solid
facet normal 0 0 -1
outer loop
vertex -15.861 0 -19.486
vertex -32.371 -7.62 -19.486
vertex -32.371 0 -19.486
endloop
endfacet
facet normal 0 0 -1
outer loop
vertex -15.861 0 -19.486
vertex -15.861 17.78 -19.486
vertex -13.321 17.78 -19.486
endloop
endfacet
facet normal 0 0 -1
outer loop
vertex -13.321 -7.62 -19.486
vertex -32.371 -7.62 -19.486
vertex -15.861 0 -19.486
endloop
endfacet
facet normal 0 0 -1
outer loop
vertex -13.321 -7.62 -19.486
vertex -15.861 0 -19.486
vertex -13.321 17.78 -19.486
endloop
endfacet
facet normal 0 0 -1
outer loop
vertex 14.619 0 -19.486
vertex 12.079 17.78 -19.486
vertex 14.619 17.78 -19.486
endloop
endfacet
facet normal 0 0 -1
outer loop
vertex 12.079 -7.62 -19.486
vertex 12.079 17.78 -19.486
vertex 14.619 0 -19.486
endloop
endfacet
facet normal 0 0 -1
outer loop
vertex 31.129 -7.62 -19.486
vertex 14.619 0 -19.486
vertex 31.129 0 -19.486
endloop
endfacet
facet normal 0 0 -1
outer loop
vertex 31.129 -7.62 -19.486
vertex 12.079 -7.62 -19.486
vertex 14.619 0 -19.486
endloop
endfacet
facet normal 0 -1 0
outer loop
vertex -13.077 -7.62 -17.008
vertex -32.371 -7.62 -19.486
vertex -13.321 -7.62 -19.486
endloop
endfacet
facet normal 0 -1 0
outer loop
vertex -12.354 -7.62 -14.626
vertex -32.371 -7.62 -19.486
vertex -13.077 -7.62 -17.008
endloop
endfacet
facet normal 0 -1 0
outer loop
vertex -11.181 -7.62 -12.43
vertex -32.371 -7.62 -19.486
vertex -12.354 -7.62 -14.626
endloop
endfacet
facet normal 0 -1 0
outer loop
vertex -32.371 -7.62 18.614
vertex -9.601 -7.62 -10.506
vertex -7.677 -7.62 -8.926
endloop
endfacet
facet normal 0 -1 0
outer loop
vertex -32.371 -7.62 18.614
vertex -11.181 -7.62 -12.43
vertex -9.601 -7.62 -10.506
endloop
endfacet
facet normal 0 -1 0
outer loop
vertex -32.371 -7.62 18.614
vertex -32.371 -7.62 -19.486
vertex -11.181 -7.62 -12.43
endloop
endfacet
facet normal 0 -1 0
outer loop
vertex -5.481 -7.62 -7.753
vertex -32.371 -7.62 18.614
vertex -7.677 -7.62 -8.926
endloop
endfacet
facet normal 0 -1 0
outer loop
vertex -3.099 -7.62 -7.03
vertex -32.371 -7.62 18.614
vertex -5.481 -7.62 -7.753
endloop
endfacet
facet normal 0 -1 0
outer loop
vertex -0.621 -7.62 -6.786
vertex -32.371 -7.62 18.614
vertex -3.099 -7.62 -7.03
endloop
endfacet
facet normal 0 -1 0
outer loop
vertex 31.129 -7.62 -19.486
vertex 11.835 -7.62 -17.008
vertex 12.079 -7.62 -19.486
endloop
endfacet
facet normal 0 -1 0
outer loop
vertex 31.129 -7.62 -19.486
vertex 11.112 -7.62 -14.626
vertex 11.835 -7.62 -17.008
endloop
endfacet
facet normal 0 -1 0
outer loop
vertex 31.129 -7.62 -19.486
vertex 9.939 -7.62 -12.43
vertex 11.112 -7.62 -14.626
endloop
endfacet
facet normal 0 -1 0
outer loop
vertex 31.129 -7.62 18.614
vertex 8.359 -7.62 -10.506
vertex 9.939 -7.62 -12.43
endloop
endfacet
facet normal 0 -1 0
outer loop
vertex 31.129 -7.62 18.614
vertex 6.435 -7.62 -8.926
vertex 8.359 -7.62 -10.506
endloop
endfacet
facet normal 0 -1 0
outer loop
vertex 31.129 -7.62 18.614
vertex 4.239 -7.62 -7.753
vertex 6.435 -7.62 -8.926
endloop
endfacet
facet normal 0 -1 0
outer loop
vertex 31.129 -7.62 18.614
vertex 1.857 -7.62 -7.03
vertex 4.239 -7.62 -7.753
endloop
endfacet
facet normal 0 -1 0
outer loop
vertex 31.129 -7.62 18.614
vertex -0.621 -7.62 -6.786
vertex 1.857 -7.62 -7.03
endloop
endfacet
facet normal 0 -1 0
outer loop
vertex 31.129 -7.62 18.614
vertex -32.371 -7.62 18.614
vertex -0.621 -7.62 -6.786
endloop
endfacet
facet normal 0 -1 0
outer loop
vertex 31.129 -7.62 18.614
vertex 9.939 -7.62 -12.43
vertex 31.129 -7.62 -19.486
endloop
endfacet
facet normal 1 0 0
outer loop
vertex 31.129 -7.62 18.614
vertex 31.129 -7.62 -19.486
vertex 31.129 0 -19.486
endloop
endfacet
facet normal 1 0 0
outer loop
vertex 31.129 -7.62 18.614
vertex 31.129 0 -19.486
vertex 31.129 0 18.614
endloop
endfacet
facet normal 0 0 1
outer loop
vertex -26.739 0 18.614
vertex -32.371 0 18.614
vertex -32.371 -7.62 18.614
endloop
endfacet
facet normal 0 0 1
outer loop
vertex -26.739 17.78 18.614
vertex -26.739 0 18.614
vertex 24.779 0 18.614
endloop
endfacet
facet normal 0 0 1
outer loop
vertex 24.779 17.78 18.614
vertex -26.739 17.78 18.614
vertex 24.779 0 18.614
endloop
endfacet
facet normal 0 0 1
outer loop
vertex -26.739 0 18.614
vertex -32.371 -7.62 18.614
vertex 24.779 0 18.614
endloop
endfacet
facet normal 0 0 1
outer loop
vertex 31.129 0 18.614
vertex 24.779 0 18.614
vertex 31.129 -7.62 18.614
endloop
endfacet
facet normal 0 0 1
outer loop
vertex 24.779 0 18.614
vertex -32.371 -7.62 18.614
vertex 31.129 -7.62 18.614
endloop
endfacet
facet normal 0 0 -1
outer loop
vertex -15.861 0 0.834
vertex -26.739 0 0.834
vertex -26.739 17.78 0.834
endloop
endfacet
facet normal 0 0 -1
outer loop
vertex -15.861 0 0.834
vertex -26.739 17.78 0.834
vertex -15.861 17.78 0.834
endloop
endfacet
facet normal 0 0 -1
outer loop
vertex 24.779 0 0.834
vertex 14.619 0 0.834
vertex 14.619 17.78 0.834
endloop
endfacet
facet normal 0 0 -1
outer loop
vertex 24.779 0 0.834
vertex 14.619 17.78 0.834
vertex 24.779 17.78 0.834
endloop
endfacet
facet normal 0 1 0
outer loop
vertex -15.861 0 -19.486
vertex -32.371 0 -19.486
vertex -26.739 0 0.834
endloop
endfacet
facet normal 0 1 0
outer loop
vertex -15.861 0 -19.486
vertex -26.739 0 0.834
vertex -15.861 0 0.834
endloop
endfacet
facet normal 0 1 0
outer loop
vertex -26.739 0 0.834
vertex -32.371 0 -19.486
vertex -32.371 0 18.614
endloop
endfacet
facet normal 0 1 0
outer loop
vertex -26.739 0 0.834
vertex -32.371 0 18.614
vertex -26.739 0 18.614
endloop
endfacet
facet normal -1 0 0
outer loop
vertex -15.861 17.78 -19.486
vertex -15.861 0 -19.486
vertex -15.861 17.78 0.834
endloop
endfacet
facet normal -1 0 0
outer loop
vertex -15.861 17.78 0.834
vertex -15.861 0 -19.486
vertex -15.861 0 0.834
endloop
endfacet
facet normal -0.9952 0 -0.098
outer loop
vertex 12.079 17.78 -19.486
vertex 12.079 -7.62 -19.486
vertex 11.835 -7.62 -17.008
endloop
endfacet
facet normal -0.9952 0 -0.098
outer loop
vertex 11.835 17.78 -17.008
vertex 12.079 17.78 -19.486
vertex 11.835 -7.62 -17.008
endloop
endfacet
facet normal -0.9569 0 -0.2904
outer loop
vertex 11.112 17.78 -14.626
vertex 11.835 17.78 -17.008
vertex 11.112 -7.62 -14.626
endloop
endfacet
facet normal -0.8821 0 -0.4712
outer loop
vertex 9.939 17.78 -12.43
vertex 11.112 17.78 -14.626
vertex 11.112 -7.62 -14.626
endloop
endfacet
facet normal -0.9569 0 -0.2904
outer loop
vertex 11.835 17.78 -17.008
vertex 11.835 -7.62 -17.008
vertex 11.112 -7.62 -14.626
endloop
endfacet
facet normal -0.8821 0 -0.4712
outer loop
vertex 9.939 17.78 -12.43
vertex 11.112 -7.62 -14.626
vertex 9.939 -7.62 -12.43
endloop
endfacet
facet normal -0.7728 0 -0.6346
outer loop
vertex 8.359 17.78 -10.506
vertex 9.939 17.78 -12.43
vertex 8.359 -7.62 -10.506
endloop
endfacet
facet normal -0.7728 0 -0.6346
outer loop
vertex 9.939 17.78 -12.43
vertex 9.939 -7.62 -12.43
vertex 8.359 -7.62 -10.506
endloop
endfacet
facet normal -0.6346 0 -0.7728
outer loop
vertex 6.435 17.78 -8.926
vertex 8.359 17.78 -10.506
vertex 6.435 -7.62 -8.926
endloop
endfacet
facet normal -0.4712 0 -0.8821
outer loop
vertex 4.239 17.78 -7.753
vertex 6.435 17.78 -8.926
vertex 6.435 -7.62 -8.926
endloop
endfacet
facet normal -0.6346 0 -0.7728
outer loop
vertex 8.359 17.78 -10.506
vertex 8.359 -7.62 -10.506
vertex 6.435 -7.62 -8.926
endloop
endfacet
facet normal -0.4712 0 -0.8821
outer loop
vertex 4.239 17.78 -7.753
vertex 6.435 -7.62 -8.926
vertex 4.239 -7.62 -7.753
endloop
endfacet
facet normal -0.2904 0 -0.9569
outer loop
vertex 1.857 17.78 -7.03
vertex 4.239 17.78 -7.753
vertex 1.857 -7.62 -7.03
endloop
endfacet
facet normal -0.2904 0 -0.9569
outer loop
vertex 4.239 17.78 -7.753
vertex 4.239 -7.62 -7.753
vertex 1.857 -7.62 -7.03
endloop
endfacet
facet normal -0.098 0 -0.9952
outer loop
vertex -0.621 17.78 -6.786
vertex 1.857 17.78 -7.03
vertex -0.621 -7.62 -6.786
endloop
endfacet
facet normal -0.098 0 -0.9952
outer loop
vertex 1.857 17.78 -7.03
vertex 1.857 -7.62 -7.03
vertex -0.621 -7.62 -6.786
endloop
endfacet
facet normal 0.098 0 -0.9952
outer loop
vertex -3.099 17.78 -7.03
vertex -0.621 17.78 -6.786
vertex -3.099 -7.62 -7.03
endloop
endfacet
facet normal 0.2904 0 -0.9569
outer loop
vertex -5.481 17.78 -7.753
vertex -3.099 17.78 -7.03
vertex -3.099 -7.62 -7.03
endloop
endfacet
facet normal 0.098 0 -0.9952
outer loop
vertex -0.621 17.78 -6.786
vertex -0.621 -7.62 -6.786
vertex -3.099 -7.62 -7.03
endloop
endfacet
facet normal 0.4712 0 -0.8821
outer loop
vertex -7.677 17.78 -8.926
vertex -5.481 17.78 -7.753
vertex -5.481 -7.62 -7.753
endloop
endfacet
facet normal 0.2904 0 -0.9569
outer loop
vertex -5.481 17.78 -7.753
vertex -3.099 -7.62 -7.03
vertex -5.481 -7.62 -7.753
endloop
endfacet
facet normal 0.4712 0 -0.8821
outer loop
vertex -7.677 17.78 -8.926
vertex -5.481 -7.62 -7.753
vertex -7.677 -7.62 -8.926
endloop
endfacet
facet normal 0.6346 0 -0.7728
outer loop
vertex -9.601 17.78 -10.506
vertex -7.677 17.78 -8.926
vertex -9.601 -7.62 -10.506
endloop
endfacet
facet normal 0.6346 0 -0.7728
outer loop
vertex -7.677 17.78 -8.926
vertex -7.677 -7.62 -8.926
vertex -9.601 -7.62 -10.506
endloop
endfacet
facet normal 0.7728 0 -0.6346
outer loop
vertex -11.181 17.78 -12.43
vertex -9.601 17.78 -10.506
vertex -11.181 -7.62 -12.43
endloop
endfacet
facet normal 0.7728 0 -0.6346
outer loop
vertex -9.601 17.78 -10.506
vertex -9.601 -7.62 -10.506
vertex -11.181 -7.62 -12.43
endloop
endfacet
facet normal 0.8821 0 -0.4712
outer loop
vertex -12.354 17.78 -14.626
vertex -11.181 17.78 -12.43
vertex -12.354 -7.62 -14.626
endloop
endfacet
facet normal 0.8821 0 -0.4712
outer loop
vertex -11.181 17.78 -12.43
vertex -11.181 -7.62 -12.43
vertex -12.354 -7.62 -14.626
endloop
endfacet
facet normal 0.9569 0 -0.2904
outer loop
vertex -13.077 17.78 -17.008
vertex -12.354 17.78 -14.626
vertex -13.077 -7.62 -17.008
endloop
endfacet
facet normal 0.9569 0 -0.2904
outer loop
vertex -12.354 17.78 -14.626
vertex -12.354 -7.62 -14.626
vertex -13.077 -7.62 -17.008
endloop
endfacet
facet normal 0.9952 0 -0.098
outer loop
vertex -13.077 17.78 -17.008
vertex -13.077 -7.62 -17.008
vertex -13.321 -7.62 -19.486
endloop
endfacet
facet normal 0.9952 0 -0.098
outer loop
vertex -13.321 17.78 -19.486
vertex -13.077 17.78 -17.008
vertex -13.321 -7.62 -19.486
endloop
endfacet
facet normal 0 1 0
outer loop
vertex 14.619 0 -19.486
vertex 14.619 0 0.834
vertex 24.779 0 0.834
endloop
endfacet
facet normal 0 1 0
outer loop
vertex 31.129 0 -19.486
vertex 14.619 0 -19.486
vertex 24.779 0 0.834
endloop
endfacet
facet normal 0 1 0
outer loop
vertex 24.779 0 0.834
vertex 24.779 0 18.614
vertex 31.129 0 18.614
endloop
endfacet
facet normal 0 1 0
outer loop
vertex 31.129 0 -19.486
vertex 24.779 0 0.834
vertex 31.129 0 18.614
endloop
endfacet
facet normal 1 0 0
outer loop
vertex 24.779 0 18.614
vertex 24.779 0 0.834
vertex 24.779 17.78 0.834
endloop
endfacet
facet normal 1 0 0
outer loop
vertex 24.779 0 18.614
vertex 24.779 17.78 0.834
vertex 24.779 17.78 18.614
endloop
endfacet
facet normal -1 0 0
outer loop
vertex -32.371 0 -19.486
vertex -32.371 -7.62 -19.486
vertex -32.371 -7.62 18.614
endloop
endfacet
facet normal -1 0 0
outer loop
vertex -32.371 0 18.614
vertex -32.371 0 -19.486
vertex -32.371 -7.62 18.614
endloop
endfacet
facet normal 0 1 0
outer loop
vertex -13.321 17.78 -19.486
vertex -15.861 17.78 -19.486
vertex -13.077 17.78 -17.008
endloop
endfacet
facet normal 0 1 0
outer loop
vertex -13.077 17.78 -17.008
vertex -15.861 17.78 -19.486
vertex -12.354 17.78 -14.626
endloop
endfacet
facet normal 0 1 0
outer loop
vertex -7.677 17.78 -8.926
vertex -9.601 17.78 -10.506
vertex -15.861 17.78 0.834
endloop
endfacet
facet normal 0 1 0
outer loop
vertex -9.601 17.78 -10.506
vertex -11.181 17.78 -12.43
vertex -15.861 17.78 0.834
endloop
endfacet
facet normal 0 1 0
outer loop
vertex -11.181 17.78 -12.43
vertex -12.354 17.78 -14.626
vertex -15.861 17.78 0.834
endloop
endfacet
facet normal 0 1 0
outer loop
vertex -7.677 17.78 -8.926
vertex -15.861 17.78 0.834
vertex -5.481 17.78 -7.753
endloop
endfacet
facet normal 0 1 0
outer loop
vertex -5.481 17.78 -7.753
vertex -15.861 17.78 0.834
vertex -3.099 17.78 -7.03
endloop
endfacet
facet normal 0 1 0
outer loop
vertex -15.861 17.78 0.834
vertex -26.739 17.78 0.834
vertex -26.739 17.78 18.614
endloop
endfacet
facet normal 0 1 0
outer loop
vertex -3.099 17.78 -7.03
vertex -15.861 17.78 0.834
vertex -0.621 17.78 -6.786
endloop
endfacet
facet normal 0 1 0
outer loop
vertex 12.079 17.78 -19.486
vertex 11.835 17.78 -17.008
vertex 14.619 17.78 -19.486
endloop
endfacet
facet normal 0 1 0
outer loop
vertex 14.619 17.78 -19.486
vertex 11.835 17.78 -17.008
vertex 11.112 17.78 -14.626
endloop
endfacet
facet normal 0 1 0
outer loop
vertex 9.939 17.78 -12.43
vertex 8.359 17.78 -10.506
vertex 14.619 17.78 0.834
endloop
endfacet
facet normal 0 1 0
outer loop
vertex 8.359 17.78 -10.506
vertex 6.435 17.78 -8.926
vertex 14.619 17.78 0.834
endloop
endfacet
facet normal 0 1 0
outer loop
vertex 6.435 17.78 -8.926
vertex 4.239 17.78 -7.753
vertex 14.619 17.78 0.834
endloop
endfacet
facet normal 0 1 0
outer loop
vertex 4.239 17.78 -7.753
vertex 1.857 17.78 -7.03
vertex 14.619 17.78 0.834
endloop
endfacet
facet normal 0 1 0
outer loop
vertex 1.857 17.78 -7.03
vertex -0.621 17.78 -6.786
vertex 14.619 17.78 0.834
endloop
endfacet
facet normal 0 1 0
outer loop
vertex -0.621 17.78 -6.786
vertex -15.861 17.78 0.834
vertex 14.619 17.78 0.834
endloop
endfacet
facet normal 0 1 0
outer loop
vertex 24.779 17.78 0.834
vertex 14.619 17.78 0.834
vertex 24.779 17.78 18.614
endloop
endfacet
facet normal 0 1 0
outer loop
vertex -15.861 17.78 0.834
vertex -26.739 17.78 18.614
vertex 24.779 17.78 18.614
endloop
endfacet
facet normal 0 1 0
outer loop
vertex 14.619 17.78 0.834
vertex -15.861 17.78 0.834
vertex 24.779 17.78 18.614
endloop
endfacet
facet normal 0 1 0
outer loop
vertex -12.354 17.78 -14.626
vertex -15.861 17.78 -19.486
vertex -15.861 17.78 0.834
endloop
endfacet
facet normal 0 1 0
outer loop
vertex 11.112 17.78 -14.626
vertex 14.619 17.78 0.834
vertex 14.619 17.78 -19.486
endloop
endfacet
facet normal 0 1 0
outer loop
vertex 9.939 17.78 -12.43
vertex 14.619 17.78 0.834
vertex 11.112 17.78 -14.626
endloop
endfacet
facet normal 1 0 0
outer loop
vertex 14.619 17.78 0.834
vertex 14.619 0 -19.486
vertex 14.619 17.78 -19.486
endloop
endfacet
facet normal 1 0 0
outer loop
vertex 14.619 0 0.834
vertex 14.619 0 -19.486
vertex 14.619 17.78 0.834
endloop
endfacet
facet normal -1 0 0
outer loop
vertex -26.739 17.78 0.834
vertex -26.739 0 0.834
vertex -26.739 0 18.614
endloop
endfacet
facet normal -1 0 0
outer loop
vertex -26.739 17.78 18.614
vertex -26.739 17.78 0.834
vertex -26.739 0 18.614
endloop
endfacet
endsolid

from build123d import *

# Parameters (mm, degrees)
F0_W      = 63.5
F0_H      = 38.1
F1_DEPTH  = 7.62
F2_DEPTH  = 17.78
F3_W      = 6.35
F3_H      = 38.1
F3_W_2    = 5.6318170339
F4_DEPTH  = 17.78
F5_W      = 16.51
F5_H      = 20.32
F6_DEPTH  = 27.92324
F7_W      = 16.51
F7_H      = 20.32
F8_DEPTH  = 28.68757
F9_R      = 12.7
F10_DEPTH = 30.26185


with BuildPart() as f1:
    # F0 (on Front) → F1 (new body)
    with BuildSketch(Plane.XZ):
        with Locations((-0.6209928542, -0.4360526333)):
            Rectangle(F0_W, F0_H)
    extrude(amount=F1_DEPTH)

    # F2 (add): a face of the model
    f2_faces = [f1.faces().sort_by_distance(p)[0] for p in [
        (-0.6209928542, 0, -0.4360526333),
    ]]
    extrude(f2_faces, amount=F2_DEPTH)

    # F3 (on Front) → F4 (cut)
    with BuildSketch(Plane.XZ):
        with Locations((27.9540071458, -0.4360526333)):
            Rectangle(F3_W, F3_H)
        with Locations((-29.5550843373, -0.4360526333)):
            Rectangle(F3_W_2, F3_H)
    extrude(amount=-F4_DEPTH, mode=Mode.SUBTRACT)

    # F5 (on Front) → F6 (cut)
    with BuildSketch(Plane.XZ):
        with Locations((-24.1159928542, -9.3260526333)):
            Rectangle(F5_W, F5_H)
    extrude(amount=-F6_DEPTH, mode=Mode.SUBTRACT)

    # F7 (on Front) → F8 (cut)
    with BuildSketch(Plane.XZ):
        with Locations((22.8740071458, -9.3260526333)):
            Rectangle(F7_W, F7_H)
    extrude(amount=-F8_DEPTH, mode=Mode.SUBTRACT)

    # F9 (on face) → F10 (cut)
    with BuildSketch(Plane.XZ.offset(7.62)):
        with Locations((-0.6209928542, -19.4860526333)):
            Circle(F9_R)
    extrude(amount=-F10_DEPTH, mode=Mode.SUBTRACT)


solid = f1.part
